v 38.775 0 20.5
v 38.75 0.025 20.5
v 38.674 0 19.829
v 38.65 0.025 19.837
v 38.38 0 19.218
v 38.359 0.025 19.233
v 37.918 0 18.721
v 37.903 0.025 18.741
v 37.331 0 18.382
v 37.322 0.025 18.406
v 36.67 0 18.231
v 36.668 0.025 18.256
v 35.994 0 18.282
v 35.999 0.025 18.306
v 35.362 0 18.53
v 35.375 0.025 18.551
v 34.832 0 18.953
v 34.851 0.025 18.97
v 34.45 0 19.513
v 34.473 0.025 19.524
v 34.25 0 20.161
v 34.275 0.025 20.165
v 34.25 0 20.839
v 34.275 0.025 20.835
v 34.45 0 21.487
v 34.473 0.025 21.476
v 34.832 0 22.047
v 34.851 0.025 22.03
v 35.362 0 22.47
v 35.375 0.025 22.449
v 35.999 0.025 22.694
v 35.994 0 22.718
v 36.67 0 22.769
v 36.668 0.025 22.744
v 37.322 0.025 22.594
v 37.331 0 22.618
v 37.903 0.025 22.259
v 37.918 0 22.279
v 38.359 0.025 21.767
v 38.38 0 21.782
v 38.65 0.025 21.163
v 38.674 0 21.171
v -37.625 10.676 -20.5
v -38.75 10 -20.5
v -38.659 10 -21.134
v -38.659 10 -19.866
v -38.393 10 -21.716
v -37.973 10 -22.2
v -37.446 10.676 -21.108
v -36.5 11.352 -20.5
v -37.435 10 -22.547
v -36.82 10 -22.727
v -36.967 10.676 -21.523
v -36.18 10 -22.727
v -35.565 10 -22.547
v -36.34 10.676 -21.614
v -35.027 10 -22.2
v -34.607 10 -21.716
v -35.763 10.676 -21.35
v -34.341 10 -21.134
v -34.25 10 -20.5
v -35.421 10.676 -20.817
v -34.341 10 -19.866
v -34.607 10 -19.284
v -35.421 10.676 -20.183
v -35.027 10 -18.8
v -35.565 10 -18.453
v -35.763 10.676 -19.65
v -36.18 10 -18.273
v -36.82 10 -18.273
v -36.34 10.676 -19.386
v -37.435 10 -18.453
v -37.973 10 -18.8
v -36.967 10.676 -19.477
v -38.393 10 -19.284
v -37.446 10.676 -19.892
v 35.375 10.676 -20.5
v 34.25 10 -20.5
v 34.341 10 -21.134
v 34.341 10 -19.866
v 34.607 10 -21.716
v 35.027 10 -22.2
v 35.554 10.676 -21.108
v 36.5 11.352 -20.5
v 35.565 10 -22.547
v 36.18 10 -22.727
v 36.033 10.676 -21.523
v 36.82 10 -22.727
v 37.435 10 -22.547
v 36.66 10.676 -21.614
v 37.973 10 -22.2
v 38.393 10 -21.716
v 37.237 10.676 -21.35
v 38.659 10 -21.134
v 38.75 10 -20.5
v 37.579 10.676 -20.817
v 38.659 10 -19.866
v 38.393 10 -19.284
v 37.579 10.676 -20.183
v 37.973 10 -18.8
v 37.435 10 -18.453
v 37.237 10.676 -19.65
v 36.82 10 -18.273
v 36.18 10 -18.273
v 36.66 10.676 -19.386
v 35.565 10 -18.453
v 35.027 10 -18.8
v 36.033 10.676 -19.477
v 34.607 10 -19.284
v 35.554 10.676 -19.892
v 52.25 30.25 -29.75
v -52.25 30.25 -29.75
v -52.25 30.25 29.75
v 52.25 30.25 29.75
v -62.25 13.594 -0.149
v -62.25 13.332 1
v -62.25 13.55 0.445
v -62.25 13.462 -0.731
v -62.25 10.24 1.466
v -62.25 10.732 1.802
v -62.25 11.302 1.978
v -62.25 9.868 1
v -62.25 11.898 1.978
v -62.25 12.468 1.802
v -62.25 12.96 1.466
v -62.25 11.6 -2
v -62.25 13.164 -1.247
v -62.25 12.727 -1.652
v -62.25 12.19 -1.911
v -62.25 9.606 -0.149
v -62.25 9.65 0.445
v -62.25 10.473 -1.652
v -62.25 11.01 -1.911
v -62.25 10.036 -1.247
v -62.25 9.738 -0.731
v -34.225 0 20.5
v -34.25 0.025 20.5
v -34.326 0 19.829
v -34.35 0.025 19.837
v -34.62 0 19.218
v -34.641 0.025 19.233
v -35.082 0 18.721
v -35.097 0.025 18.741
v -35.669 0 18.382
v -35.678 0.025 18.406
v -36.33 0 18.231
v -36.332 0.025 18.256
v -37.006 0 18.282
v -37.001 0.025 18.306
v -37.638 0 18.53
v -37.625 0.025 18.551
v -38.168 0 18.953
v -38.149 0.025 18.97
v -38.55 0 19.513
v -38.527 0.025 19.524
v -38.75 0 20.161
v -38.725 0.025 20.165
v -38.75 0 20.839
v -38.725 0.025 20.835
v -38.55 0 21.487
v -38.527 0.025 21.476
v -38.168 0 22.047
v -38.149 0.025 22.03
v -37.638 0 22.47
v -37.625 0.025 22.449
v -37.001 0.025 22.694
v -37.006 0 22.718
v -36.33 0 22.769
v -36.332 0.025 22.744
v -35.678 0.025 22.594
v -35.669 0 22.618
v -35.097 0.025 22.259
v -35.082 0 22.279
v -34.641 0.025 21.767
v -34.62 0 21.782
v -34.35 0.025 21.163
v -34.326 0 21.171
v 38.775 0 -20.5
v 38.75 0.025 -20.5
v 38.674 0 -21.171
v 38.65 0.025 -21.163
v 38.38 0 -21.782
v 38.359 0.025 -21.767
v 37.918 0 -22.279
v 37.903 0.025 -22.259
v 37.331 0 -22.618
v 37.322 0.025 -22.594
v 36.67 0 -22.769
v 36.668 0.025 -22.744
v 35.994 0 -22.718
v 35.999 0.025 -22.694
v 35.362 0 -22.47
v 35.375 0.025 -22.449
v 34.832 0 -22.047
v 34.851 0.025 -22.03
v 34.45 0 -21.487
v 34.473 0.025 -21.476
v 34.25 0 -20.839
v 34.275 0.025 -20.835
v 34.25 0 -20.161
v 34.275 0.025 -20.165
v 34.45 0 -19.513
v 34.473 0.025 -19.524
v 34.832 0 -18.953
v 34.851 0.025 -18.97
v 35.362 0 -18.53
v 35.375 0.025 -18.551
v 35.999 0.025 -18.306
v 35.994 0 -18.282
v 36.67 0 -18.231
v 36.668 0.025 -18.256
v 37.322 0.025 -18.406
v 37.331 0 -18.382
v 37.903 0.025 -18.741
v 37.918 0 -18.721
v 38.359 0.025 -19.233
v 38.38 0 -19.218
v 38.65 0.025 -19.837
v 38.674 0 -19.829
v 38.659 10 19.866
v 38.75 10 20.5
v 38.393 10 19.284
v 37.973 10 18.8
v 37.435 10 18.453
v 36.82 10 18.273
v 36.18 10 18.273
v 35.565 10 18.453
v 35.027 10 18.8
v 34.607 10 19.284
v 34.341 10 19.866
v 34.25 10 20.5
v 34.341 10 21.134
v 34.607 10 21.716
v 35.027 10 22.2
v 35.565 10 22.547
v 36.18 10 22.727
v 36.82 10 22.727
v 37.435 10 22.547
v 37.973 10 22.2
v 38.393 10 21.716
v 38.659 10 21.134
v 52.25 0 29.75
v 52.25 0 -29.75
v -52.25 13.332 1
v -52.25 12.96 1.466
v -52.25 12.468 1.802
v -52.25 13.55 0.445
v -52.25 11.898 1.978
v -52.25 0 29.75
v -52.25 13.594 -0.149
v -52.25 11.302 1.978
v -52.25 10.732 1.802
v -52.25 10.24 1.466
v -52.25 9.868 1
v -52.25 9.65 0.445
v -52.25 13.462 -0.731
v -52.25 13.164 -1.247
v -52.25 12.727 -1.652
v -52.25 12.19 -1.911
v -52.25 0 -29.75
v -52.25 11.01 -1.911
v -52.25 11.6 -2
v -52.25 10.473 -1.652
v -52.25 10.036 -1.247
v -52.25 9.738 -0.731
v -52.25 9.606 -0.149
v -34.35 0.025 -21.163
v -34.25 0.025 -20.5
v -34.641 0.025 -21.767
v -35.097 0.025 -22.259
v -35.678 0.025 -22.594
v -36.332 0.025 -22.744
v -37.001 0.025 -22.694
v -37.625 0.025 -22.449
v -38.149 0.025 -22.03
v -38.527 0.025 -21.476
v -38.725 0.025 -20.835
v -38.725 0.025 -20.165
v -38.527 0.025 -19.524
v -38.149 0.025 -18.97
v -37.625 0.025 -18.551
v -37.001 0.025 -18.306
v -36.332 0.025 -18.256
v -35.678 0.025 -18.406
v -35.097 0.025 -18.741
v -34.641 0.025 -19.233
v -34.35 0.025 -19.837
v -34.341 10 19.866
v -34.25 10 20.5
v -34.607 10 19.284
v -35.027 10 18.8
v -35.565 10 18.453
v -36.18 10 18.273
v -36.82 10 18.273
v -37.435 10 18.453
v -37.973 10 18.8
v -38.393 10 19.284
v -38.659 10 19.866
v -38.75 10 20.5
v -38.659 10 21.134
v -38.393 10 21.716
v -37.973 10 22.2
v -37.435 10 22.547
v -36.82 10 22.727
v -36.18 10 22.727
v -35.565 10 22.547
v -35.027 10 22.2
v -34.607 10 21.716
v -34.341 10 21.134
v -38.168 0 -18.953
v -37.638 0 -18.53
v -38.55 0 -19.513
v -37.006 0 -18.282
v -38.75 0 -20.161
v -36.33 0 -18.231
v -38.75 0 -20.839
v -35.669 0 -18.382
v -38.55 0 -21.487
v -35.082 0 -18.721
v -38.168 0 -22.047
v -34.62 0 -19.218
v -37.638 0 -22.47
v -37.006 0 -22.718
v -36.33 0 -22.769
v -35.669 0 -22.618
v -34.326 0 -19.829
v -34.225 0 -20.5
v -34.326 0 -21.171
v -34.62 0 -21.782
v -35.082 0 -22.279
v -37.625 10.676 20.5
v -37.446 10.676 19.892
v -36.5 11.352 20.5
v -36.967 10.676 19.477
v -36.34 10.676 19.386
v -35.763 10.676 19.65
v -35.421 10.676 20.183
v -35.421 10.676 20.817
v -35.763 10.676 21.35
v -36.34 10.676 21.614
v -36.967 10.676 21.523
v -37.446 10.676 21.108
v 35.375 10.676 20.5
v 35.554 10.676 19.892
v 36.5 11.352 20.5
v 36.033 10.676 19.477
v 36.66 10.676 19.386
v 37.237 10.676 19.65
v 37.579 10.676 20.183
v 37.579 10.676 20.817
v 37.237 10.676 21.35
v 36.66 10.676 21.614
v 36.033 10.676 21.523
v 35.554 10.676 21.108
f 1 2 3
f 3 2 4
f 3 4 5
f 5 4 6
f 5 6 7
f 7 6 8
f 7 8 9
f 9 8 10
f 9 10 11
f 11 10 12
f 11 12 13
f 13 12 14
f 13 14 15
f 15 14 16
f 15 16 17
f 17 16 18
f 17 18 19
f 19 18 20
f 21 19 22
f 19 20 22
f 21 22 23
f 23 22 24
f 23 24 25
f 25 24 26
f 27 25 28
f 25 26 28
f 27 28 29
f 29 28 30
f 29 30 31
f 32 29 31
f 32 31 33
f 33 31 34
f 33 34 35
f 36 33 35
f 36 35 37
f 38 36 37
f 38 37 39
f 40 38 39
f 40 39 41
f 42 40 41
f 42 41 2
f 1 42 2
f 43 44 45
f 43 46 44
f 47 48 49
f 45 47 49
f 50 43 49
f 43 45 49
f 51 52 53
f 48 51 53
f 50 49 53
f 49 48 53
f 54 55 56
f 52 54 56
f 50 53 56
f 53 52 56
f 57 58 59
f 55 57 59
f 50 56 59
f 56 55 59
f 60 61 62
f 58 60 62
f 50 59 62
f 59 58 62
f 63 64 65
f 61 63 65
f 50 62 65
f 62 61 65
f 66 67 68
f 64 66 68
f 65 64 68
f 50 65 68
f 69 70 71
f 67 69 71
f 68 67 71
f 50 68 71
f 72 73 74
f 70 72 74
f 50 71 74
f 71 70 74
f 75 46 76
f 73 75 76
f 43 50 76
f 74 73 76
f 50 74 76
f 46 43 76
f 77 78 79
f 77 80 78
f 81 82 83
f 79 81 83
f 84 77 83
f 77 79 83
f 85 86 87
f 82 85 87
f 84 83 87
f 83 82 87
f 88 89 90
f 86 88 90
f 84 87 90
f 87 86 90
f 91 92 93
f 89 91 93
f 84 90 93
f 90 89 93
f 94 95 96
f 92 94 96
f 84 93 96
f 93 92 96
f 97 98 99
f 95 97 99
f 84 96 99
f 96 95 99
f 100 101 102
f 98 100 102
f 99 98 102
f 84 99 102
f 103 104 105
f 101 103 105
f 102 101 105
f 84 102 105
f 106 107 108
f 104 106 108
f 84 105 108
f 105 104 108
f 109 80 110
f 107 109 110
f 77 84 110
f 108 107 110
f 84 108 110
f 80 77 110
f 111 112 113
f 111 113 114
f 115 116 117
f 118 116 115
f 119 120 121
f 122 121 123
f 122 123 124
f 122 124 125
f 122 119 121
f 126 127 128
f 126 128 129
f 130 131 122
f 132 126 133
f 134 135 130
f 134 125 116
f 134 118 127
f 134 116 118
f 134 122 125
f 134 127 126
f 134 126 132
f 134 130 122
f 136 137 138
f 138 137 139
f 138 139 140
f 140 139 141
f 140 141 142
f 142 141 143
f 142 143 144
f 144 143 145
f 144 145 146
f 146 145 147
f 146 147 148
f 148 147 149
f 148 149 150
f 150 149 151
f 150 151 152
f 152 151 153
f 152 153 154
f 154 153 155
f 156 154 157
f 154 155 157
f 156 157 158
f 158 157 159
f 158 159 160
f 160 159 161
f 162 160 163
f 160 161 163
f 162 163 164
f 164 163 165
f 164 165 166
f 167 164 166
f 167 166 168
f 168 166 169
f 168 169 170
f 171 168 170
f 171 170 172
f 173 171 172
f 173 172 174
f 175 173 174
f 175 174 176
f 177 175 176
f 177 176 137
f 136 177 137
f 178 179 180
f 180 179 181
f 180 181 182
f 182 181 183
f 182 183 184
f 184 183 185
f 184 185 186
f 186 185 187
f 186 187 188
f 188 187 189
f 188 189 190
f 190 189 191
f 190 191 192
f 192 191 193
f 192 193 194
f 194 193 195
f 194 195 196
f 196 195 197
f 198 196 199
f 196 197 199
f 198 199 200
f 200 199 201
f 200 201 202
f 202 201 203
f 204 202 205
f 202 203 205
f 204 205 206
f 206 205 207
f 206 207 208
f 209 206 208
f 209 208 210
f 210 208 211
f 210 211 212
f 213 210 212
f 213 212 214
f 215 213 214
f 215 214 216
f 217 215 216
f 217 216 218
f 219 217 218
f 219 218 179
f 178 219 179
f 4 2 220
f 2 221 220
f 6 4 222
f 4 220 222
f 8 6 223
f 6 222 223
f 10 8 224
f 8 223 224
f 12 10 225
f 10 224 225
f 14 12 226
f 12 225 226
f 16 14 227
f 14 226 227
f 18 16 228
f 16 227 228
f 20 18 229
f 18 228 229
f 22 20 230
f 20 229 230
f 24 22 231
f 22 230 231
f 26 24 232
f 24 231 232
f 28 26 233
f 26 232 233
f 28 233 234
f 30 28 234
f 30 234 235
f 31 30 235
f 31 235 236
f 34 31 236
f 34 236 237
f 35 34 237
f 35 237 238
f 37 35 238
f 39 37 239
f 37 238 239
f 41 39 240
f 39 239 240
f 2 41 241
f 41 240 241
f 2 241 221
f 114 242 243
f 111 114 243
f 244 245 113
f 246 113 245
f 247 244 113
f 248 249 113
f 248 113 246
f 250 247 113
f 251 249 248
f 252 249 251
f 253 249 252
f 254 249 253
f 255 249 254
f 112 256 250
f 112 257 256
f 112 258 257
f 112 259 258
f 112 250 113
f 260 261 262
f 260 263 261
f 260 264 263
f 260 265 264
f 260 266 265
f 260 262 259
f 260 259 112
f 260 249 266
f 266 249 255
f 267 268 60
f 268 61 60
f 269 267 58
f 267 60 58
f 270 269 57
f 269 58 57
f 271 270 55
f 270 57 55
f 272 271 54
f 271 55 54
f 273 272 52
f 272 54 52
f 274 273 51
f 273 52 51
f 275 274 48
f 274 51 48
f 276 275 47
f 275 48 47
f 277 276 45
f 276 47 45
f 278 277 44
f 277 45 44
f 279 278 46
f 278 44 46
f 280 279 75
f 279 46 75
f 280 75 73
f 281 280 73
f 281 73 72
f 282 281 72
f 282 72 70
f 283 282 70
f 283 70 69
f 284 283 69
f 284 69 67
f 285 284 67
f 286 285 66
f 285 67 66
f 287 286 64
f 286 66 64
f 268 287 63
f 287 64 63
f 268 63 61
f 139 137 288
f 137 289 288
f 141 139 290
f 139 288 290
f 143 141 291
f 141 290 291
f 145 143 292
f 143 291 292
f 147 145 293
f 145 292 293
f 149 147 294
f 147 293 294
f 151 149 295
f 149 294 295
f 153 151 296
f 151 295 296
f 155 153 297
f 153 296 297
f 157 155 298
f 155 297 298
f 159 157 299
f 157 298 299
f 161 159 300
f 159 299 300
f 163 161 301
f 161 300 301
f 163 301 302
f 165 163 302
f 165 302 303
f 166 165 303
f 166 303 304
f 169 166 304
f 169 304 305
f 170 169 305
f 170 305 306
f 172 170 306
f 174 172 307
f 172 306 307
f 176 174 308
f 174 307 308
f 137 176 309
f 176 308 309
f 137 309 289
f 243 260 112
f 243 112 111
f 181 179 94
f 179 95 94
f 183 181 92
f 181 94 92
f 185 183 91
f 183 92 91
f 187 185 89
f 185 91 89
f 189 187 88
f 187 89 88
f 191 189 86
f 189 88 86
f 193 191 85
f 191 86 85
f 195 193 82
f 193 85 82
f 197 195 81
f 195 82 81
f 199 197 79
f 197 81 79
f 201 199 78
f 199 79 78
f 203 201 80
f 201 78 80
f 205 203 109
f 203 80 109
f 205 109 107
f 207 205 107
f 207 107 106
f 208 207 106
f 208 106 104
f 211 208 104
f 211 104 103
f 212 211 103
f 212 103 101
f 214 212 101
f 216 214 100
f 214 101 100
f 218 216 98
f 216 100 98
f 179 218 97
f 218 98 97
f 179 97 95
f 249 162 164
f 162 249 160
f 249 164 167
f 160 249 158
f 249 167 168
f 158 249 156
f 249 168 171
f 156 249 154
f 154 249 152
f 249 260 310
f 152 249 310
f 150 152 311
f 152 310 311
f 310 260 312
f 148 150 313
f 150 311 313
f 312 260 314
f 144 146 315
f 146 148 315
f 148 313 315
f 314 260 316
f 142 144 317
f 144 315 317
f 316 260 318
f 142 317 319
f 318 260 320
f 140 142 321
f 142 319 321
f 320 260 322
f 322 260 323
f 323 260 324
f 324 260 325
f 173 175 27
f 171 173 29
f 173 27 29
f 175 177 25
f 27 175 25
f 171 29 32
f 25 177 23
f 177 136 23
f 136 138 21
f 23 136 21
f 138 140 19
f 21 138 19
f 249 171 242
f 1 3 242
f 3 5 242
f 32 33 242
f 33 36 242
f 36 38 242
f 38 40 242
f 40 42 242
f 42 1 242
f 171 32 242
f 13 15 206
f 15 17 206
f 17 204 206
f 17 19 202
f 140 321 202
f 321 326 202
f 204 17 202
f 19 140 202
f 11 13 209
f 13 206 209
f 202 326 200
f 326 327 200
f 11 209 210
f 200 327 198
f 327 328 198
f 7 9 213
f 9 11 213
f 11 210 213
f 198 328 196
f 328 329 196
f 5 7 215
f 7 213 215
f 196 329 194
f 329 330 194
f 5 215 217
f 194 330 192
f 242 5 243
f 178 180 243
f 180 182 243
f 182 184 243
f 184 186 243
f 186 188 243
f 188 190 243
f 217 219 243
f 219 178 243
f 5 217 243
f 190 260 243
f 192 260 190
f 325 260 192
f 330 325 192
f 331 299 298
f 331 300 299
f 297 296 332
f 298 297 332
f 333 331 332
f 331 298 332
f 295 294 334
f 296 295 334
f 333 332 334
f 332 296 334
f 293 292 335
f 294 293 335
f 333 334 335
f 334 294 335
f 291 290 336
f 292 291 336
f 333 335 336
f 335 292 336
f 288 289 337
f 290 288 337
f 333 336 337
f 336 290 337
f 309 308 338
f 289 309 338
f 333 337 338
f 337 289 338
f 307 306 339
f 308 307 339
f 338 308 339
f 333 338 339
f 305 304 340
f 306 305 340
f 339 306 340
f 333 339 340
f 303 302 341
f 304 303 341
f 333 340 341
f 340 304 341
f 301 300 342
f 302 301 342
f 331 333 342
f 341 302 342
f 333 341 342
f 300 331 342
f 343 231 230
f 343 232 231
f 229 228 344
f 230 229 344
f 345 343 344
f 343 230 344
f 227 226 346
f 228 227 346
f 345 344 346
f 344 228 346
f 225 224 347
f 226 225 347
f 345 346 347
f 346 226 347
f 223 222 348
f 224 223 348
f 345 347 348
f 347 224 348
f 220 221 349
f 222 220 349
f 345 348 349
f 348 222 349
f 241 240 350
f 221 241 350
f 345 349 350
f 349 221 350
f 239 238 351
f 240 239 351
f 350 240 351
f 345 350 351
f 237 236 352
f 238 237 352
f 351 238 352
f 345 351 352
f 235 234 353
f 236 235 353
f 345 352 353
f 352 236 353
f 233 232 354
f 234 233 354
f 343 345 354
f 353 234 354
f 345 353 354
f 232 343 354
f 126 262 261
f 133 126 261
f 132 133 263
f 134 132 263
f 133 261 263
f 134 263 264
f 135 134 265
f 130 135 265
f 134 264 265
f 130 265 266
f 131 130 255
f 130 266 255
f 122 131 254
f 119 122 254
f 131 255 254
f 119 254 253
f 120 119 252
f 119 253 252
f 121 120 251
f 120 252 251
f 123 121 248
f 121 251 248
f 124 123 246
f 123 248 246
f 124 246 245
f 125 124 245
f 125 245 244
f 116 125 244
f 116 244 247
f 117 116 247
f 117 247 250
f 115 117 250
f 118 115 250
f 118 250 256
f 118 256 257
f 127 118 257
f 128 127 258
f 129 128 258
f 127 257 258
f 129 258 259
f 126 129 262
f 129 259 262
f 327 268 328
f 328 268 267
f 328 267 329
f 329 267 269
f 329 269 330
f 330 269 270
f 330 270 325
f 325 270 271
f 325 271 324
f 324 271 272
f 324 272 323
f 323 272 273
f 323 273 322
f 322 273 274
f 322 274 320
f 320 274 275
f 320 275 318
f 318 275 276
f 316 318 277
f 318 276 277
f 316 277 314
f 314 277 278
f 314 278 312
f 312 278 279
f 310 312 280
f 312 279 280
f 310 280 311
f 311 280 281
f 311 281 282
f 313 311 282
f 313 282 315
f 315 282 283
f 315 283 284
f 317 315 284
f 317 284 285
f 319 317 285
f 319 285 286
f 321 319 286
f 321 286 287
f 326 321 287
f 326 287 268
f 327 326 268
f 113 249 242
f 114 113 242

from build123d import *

# Parameters (mm, degrees)
SKETCH1_W                      = 104.5
SKETCH1_H                      = 59.5
BOSS_EXTRUDE1_DEPTH            = 30.25
SKETCH2_R                      = 2
BOSS_EXTRUDE2_DEPTH            = 10
M4_CLEARANCE_HOLE1_D           = 4.5
M4_CLEARANCE_HOLE1_DEPTH       = 10
M4_CLEARANCE_HOLE1_CSINK_D     = 4.55
M4_CLEARANCE_HOLE1_CSINK_ANGLE = 90
M4_CLEARANCE_HOLE1_TIP         = 1.351936393


with BuildPart() as part:
    # Sketch1 → Boss-Extrude1 (new body)
    with BuildSketch(Plane(origin=(0, 0, 0), x_dir=(1, 0, 0), z_dir=(0, 1, 0))):
        Rectangle(SKETCH1_W, SKETCH1_H)
    extrude(amount=BOSS_EXTRUDE1_DEPTH)

    # Sketch2 → Boss-Extrude2 (add)
    with BuildSketch(Plane.ZY.offset(52.25)):
        with Locations(Location((0, 11.6, 0), (0, 0, 180))):
            Circle(SKETCH2_R)
    extrude(amount=BOSS_EXTRUDE2_DEPTH)

    # M4 Clearance Hole1
    with Locations(Plane(origin=(0, 0, 0), x_dir=(-1, 0, 0), z_dir=(0, -1, 0))):
        with Locations((36.5, 20.5), (-36.5, 20.5), (-36.5, -20.5), (36.5, -20.5)):
            CounterSinkHole(M4_CLEARANCE_HOLE1_D / 2, M4_CLEARANCE_HOLE1_CSINK_D / 2, depth=M4_CLEARANCE_HOLE1_DEPTH, counter_sink_angle=M4_CLEARANCE_HOLE1_CSINK_ANGLE)
            with Locations((0, 0, -(M4_CLEARANCE_HOLE1_DEPTH + M4_CLEARANCE_HOLE1_TIP / 2))):  # 118° drill point
                Cone(0, M4_CLEARANCE_HOLE1_D / 2, M4_CLEARANCE_HOLE1_TIP, mode=Mode.SUBTRACT)


solid = part.part
